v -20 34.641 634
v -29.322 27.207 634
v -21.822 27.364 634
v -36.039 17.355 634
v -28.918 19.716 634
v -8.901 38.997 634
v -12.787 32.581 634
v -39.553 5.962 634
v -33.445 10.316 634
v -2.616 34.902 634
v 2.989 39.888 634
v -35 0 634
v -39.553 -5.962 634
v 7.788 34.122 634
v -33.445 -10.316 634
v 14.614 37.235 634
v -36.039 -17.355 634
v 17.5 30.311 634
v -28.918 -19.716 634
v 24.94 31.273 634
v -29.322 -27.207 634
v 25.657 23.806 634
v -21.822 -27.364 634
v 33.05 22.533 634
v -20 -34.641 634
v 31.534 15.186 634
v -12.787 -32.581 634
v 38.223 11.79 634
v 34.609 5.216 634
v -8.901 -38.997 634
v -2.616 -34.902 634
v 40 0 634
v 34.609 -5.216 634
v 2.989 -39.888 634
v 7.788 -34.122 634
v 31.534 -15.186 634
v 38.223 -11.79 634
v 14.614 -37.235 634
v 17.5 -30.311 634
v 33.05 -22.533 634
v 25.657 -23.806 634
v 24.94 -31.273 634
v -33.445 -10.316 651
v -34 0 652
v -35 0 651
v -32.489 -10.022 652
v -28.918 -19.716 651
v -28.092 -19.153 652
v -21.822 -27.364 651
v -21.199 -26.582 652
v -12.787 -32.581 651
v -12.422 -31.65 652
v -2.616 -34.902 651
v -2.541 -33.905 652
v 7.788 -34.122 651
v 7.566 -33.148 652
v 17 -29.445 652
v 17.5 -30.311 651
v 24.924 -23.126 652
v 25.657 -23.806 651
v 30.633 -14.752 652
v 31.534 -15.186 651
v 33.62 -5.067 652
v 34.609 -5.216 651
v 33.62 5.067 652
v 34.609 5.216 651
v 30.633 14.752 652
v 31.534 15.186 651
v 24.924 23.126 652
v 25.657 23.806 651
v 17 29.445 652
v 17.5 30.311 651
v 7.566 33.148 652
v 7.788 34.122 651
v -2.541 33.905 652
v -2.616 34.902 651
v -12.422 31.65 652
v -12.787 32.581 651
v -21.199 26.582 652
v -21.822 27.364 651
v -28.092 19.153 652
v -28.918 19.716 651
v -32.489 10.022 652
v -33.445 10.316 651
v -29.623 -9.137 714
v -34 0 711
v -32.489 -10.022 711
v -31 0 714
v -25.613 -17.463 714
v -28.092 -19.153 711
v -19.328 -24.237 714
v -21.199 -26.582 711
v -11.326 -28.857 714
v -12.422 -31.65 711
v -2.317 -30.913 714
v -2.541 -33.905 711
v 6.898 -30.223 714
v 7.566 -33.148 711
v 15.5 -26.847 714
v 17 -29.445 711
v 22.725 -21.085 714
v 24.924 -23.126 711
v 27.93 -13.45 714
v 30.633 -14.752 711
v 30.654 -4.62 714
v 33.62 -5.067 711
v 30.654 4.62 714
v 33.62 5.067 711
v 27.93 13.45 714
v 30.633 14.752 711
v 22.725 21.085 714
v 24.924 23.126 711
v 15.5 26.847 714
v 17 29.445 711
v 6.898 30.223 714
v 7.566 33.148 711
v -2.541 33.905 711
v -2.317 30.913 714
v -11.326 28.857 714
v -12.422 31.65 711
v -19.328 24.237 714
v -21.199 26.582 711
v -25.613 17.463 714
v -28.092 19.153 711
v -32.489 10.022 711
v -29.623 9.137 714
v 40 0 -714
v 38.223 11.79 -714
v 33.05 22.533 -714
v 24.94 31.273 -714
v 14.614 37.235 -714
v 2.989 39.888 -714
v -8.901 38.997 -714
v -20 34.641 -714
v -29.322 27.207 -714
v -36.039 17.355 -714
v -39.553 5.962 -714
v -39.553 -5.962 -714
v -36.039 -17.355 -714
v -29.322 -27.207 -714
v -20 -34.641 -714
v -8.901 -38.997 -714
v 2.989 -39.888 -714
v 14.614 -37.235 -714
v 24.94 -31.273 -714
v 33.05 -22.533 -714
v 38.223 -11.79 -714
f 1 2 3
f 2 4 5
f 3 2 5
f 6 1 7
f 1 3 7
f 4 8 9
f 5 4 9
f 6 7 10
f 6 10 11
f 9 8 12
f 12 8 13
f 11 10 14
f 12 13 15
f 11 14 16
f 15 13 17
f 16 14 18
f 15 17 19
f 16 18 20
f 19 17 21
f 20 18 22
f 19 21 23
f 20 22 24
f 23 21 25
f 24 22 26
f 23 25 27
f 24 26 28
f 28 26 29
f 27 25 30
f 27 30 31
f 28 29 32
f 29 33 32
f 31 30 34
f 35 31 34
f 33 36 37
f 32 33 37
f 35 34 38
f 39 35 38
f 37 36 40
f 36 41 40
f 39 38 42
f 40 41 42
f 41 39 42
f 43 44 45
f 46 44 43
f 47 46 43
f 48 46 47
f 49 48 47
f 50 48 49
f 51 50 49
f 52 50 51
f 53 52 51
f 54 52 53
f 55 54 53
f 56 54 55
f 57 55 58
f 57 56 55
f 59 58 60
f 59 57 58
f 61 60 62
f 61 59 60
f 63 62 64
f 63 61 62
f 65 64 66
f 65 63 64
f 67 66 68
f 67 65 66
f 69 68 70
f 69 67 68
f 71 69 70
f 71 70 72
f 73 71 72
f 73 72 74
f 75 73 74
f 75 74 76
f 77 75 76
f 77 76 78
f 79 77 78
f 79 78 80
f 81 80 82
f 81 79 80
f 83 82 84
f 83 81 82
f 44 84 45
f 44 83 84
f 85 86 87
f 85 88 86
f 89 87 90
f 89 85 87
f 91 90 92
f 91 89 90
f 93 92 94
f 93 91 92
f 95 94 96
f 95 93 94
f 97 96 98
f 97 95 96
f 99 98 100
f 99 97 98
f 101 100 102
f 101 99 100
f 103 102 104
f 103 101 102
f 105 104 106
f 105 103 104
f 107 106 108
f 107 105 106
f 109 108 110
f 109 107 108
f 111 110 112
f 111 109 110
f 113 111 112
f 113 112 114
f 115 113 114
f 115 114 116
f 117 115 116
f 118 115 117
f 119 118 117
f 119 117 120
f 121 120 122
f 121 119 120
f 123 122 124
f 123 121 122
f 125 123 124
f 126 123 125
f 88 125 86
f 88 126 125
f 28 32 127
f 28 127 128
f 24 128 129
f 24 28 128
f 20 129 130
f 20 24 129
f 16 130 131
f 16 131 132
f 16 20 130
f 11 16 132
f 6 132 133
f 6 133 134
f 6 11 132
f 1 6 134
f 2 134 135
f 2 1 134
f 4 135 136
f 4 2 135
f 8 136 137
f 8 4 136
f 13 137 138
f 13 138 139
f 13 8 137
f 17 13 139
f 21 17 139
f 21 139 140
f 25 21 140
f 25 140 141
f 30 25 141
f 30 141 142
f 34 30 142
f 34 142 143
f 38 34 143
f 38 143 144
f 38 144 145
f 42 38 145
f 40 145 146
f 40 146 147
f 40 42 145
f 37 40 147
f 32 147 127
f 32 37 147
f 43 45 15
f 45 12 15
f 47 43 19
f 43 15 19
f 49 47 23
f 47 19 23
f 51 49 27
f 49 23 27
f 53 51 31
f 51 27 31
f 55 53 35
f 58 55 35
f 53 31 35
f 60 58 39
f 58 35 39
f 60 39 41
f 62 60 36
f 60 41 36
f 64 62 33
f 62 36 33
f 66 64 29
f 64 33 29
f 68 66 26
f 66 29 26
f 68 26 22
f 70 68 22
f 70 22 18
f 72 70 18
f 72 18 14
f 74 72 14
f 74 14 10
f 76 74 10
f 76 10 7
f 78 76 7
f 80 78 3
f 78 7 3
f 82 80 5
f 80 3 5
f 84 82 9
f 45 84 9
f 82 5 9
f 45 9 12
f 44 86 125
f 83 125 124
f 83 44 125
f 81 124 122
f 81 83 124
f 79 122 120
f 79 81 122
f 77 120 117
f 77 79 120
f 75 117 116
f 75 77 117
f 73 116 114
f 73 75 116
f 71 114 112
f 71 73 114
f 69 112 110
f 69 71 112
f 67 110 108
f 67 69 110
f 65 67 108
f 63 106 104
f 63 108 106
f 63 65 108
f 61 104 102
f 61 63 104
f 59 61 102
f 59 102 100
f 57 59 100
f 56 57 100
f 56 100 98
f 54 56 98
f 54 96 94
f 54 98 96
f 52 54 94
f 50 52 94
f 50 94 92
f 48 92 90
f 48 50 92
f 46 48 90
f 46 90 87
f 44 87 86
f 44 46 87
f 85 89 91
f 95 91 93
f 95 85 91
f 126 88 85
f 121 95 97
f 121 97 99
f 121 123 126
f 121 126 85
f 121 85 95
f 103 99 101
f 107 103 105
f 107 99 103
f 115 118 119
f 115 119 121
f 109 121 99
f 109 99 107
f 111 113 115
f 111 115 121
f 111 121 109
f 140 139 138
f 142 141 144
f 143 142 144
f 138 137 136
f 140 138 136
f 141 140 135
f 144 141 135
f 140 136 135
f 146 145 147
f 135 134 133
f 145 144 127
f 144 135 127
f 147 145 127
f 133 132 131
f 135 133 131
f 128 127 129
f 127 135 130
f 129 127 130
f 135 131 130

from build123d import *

# Parameters (mm, degrees)
SKETCH1_R           = 40
BOSS_EXTRUDE1_DEPTH = 714
CHAMFER1_SIZE       = 3


with BuildPart() as part:
    # Sketch1 → Boss-Extrude1 (new, symmetric)
    with BuildSketch(Plane.XY):
        Circle(SKETCH1_R)
    extrude(amount=BOSS_EXTRUDE1_DEPTH, both=True)

    # Sketch2 → Cut-Revolve1 (revolve, cut)
    with BuildSketch(Plane(origin=(0, 0, 0), x_dir=(0, 0, -1), z_dir=(1, 0, 0)), mode=Mode.PRIVATE) as cut_revolve1_sk:
        Polygon((-714, 34), (-654, 34), (-654, 35), (-634, 35), (-634, 52.852263241), (-714, 52.852263241), align=None)
    revolve(cut_revolve1_sk.sketch.rotate(Axis((0, 0, 0), (0, 0, 1)), 90), axis=Axis((0, 0, 0), (0, 0, 1)), mode=Mode.SUBTRACT)

    # Chamfer1
    # the kernel refuses this chamfer: 3 mm, written as the material it takes off along each edge
    with BuildSketch(Plane(origin=(0, 0, 654), x_dir=(-1, 0, 0), z_dir=(0, 1, 0))) as chamfer1_piece_1_section:
        Polygon((35, -CHAMFER1_SIZE), (35 - CHAMFER1_SIZE, 0), (35, 0), align=None)
    chamfer1_piece_1 = revolve(axis=Axis((0, 0, 654), (0, 0, 1)), mode=Mode.PRIVATE)
    chamfer1_piece_1 = chamfer1_piece_1 - Plane(origin=(0, 0, 651.51733658), x_dir=(-1, 0, 0), z_dir=(0, 0, -1)) * Cylinder(34, 140, mode=Mode.PRIVATE)
    add(chamfer1_piece_1, mode=Mode.SUBTRACT)
    with BuildSketch(Plane(origin=(0, 0, 714), x_dir=(-1, 0, 0), z_dir=(0, 1, 0))) as chamfer1_piece_2:
        Polygon((34, -CHAMFER1_SIZE), (34 - CHAMFER1_SIZE, 0), (34, 0), align=None)
    revolve(axis=Axis((0, 0, 714), (0, 0, 1)), mode=Mode.SUBTRACT)


solid = part.part
